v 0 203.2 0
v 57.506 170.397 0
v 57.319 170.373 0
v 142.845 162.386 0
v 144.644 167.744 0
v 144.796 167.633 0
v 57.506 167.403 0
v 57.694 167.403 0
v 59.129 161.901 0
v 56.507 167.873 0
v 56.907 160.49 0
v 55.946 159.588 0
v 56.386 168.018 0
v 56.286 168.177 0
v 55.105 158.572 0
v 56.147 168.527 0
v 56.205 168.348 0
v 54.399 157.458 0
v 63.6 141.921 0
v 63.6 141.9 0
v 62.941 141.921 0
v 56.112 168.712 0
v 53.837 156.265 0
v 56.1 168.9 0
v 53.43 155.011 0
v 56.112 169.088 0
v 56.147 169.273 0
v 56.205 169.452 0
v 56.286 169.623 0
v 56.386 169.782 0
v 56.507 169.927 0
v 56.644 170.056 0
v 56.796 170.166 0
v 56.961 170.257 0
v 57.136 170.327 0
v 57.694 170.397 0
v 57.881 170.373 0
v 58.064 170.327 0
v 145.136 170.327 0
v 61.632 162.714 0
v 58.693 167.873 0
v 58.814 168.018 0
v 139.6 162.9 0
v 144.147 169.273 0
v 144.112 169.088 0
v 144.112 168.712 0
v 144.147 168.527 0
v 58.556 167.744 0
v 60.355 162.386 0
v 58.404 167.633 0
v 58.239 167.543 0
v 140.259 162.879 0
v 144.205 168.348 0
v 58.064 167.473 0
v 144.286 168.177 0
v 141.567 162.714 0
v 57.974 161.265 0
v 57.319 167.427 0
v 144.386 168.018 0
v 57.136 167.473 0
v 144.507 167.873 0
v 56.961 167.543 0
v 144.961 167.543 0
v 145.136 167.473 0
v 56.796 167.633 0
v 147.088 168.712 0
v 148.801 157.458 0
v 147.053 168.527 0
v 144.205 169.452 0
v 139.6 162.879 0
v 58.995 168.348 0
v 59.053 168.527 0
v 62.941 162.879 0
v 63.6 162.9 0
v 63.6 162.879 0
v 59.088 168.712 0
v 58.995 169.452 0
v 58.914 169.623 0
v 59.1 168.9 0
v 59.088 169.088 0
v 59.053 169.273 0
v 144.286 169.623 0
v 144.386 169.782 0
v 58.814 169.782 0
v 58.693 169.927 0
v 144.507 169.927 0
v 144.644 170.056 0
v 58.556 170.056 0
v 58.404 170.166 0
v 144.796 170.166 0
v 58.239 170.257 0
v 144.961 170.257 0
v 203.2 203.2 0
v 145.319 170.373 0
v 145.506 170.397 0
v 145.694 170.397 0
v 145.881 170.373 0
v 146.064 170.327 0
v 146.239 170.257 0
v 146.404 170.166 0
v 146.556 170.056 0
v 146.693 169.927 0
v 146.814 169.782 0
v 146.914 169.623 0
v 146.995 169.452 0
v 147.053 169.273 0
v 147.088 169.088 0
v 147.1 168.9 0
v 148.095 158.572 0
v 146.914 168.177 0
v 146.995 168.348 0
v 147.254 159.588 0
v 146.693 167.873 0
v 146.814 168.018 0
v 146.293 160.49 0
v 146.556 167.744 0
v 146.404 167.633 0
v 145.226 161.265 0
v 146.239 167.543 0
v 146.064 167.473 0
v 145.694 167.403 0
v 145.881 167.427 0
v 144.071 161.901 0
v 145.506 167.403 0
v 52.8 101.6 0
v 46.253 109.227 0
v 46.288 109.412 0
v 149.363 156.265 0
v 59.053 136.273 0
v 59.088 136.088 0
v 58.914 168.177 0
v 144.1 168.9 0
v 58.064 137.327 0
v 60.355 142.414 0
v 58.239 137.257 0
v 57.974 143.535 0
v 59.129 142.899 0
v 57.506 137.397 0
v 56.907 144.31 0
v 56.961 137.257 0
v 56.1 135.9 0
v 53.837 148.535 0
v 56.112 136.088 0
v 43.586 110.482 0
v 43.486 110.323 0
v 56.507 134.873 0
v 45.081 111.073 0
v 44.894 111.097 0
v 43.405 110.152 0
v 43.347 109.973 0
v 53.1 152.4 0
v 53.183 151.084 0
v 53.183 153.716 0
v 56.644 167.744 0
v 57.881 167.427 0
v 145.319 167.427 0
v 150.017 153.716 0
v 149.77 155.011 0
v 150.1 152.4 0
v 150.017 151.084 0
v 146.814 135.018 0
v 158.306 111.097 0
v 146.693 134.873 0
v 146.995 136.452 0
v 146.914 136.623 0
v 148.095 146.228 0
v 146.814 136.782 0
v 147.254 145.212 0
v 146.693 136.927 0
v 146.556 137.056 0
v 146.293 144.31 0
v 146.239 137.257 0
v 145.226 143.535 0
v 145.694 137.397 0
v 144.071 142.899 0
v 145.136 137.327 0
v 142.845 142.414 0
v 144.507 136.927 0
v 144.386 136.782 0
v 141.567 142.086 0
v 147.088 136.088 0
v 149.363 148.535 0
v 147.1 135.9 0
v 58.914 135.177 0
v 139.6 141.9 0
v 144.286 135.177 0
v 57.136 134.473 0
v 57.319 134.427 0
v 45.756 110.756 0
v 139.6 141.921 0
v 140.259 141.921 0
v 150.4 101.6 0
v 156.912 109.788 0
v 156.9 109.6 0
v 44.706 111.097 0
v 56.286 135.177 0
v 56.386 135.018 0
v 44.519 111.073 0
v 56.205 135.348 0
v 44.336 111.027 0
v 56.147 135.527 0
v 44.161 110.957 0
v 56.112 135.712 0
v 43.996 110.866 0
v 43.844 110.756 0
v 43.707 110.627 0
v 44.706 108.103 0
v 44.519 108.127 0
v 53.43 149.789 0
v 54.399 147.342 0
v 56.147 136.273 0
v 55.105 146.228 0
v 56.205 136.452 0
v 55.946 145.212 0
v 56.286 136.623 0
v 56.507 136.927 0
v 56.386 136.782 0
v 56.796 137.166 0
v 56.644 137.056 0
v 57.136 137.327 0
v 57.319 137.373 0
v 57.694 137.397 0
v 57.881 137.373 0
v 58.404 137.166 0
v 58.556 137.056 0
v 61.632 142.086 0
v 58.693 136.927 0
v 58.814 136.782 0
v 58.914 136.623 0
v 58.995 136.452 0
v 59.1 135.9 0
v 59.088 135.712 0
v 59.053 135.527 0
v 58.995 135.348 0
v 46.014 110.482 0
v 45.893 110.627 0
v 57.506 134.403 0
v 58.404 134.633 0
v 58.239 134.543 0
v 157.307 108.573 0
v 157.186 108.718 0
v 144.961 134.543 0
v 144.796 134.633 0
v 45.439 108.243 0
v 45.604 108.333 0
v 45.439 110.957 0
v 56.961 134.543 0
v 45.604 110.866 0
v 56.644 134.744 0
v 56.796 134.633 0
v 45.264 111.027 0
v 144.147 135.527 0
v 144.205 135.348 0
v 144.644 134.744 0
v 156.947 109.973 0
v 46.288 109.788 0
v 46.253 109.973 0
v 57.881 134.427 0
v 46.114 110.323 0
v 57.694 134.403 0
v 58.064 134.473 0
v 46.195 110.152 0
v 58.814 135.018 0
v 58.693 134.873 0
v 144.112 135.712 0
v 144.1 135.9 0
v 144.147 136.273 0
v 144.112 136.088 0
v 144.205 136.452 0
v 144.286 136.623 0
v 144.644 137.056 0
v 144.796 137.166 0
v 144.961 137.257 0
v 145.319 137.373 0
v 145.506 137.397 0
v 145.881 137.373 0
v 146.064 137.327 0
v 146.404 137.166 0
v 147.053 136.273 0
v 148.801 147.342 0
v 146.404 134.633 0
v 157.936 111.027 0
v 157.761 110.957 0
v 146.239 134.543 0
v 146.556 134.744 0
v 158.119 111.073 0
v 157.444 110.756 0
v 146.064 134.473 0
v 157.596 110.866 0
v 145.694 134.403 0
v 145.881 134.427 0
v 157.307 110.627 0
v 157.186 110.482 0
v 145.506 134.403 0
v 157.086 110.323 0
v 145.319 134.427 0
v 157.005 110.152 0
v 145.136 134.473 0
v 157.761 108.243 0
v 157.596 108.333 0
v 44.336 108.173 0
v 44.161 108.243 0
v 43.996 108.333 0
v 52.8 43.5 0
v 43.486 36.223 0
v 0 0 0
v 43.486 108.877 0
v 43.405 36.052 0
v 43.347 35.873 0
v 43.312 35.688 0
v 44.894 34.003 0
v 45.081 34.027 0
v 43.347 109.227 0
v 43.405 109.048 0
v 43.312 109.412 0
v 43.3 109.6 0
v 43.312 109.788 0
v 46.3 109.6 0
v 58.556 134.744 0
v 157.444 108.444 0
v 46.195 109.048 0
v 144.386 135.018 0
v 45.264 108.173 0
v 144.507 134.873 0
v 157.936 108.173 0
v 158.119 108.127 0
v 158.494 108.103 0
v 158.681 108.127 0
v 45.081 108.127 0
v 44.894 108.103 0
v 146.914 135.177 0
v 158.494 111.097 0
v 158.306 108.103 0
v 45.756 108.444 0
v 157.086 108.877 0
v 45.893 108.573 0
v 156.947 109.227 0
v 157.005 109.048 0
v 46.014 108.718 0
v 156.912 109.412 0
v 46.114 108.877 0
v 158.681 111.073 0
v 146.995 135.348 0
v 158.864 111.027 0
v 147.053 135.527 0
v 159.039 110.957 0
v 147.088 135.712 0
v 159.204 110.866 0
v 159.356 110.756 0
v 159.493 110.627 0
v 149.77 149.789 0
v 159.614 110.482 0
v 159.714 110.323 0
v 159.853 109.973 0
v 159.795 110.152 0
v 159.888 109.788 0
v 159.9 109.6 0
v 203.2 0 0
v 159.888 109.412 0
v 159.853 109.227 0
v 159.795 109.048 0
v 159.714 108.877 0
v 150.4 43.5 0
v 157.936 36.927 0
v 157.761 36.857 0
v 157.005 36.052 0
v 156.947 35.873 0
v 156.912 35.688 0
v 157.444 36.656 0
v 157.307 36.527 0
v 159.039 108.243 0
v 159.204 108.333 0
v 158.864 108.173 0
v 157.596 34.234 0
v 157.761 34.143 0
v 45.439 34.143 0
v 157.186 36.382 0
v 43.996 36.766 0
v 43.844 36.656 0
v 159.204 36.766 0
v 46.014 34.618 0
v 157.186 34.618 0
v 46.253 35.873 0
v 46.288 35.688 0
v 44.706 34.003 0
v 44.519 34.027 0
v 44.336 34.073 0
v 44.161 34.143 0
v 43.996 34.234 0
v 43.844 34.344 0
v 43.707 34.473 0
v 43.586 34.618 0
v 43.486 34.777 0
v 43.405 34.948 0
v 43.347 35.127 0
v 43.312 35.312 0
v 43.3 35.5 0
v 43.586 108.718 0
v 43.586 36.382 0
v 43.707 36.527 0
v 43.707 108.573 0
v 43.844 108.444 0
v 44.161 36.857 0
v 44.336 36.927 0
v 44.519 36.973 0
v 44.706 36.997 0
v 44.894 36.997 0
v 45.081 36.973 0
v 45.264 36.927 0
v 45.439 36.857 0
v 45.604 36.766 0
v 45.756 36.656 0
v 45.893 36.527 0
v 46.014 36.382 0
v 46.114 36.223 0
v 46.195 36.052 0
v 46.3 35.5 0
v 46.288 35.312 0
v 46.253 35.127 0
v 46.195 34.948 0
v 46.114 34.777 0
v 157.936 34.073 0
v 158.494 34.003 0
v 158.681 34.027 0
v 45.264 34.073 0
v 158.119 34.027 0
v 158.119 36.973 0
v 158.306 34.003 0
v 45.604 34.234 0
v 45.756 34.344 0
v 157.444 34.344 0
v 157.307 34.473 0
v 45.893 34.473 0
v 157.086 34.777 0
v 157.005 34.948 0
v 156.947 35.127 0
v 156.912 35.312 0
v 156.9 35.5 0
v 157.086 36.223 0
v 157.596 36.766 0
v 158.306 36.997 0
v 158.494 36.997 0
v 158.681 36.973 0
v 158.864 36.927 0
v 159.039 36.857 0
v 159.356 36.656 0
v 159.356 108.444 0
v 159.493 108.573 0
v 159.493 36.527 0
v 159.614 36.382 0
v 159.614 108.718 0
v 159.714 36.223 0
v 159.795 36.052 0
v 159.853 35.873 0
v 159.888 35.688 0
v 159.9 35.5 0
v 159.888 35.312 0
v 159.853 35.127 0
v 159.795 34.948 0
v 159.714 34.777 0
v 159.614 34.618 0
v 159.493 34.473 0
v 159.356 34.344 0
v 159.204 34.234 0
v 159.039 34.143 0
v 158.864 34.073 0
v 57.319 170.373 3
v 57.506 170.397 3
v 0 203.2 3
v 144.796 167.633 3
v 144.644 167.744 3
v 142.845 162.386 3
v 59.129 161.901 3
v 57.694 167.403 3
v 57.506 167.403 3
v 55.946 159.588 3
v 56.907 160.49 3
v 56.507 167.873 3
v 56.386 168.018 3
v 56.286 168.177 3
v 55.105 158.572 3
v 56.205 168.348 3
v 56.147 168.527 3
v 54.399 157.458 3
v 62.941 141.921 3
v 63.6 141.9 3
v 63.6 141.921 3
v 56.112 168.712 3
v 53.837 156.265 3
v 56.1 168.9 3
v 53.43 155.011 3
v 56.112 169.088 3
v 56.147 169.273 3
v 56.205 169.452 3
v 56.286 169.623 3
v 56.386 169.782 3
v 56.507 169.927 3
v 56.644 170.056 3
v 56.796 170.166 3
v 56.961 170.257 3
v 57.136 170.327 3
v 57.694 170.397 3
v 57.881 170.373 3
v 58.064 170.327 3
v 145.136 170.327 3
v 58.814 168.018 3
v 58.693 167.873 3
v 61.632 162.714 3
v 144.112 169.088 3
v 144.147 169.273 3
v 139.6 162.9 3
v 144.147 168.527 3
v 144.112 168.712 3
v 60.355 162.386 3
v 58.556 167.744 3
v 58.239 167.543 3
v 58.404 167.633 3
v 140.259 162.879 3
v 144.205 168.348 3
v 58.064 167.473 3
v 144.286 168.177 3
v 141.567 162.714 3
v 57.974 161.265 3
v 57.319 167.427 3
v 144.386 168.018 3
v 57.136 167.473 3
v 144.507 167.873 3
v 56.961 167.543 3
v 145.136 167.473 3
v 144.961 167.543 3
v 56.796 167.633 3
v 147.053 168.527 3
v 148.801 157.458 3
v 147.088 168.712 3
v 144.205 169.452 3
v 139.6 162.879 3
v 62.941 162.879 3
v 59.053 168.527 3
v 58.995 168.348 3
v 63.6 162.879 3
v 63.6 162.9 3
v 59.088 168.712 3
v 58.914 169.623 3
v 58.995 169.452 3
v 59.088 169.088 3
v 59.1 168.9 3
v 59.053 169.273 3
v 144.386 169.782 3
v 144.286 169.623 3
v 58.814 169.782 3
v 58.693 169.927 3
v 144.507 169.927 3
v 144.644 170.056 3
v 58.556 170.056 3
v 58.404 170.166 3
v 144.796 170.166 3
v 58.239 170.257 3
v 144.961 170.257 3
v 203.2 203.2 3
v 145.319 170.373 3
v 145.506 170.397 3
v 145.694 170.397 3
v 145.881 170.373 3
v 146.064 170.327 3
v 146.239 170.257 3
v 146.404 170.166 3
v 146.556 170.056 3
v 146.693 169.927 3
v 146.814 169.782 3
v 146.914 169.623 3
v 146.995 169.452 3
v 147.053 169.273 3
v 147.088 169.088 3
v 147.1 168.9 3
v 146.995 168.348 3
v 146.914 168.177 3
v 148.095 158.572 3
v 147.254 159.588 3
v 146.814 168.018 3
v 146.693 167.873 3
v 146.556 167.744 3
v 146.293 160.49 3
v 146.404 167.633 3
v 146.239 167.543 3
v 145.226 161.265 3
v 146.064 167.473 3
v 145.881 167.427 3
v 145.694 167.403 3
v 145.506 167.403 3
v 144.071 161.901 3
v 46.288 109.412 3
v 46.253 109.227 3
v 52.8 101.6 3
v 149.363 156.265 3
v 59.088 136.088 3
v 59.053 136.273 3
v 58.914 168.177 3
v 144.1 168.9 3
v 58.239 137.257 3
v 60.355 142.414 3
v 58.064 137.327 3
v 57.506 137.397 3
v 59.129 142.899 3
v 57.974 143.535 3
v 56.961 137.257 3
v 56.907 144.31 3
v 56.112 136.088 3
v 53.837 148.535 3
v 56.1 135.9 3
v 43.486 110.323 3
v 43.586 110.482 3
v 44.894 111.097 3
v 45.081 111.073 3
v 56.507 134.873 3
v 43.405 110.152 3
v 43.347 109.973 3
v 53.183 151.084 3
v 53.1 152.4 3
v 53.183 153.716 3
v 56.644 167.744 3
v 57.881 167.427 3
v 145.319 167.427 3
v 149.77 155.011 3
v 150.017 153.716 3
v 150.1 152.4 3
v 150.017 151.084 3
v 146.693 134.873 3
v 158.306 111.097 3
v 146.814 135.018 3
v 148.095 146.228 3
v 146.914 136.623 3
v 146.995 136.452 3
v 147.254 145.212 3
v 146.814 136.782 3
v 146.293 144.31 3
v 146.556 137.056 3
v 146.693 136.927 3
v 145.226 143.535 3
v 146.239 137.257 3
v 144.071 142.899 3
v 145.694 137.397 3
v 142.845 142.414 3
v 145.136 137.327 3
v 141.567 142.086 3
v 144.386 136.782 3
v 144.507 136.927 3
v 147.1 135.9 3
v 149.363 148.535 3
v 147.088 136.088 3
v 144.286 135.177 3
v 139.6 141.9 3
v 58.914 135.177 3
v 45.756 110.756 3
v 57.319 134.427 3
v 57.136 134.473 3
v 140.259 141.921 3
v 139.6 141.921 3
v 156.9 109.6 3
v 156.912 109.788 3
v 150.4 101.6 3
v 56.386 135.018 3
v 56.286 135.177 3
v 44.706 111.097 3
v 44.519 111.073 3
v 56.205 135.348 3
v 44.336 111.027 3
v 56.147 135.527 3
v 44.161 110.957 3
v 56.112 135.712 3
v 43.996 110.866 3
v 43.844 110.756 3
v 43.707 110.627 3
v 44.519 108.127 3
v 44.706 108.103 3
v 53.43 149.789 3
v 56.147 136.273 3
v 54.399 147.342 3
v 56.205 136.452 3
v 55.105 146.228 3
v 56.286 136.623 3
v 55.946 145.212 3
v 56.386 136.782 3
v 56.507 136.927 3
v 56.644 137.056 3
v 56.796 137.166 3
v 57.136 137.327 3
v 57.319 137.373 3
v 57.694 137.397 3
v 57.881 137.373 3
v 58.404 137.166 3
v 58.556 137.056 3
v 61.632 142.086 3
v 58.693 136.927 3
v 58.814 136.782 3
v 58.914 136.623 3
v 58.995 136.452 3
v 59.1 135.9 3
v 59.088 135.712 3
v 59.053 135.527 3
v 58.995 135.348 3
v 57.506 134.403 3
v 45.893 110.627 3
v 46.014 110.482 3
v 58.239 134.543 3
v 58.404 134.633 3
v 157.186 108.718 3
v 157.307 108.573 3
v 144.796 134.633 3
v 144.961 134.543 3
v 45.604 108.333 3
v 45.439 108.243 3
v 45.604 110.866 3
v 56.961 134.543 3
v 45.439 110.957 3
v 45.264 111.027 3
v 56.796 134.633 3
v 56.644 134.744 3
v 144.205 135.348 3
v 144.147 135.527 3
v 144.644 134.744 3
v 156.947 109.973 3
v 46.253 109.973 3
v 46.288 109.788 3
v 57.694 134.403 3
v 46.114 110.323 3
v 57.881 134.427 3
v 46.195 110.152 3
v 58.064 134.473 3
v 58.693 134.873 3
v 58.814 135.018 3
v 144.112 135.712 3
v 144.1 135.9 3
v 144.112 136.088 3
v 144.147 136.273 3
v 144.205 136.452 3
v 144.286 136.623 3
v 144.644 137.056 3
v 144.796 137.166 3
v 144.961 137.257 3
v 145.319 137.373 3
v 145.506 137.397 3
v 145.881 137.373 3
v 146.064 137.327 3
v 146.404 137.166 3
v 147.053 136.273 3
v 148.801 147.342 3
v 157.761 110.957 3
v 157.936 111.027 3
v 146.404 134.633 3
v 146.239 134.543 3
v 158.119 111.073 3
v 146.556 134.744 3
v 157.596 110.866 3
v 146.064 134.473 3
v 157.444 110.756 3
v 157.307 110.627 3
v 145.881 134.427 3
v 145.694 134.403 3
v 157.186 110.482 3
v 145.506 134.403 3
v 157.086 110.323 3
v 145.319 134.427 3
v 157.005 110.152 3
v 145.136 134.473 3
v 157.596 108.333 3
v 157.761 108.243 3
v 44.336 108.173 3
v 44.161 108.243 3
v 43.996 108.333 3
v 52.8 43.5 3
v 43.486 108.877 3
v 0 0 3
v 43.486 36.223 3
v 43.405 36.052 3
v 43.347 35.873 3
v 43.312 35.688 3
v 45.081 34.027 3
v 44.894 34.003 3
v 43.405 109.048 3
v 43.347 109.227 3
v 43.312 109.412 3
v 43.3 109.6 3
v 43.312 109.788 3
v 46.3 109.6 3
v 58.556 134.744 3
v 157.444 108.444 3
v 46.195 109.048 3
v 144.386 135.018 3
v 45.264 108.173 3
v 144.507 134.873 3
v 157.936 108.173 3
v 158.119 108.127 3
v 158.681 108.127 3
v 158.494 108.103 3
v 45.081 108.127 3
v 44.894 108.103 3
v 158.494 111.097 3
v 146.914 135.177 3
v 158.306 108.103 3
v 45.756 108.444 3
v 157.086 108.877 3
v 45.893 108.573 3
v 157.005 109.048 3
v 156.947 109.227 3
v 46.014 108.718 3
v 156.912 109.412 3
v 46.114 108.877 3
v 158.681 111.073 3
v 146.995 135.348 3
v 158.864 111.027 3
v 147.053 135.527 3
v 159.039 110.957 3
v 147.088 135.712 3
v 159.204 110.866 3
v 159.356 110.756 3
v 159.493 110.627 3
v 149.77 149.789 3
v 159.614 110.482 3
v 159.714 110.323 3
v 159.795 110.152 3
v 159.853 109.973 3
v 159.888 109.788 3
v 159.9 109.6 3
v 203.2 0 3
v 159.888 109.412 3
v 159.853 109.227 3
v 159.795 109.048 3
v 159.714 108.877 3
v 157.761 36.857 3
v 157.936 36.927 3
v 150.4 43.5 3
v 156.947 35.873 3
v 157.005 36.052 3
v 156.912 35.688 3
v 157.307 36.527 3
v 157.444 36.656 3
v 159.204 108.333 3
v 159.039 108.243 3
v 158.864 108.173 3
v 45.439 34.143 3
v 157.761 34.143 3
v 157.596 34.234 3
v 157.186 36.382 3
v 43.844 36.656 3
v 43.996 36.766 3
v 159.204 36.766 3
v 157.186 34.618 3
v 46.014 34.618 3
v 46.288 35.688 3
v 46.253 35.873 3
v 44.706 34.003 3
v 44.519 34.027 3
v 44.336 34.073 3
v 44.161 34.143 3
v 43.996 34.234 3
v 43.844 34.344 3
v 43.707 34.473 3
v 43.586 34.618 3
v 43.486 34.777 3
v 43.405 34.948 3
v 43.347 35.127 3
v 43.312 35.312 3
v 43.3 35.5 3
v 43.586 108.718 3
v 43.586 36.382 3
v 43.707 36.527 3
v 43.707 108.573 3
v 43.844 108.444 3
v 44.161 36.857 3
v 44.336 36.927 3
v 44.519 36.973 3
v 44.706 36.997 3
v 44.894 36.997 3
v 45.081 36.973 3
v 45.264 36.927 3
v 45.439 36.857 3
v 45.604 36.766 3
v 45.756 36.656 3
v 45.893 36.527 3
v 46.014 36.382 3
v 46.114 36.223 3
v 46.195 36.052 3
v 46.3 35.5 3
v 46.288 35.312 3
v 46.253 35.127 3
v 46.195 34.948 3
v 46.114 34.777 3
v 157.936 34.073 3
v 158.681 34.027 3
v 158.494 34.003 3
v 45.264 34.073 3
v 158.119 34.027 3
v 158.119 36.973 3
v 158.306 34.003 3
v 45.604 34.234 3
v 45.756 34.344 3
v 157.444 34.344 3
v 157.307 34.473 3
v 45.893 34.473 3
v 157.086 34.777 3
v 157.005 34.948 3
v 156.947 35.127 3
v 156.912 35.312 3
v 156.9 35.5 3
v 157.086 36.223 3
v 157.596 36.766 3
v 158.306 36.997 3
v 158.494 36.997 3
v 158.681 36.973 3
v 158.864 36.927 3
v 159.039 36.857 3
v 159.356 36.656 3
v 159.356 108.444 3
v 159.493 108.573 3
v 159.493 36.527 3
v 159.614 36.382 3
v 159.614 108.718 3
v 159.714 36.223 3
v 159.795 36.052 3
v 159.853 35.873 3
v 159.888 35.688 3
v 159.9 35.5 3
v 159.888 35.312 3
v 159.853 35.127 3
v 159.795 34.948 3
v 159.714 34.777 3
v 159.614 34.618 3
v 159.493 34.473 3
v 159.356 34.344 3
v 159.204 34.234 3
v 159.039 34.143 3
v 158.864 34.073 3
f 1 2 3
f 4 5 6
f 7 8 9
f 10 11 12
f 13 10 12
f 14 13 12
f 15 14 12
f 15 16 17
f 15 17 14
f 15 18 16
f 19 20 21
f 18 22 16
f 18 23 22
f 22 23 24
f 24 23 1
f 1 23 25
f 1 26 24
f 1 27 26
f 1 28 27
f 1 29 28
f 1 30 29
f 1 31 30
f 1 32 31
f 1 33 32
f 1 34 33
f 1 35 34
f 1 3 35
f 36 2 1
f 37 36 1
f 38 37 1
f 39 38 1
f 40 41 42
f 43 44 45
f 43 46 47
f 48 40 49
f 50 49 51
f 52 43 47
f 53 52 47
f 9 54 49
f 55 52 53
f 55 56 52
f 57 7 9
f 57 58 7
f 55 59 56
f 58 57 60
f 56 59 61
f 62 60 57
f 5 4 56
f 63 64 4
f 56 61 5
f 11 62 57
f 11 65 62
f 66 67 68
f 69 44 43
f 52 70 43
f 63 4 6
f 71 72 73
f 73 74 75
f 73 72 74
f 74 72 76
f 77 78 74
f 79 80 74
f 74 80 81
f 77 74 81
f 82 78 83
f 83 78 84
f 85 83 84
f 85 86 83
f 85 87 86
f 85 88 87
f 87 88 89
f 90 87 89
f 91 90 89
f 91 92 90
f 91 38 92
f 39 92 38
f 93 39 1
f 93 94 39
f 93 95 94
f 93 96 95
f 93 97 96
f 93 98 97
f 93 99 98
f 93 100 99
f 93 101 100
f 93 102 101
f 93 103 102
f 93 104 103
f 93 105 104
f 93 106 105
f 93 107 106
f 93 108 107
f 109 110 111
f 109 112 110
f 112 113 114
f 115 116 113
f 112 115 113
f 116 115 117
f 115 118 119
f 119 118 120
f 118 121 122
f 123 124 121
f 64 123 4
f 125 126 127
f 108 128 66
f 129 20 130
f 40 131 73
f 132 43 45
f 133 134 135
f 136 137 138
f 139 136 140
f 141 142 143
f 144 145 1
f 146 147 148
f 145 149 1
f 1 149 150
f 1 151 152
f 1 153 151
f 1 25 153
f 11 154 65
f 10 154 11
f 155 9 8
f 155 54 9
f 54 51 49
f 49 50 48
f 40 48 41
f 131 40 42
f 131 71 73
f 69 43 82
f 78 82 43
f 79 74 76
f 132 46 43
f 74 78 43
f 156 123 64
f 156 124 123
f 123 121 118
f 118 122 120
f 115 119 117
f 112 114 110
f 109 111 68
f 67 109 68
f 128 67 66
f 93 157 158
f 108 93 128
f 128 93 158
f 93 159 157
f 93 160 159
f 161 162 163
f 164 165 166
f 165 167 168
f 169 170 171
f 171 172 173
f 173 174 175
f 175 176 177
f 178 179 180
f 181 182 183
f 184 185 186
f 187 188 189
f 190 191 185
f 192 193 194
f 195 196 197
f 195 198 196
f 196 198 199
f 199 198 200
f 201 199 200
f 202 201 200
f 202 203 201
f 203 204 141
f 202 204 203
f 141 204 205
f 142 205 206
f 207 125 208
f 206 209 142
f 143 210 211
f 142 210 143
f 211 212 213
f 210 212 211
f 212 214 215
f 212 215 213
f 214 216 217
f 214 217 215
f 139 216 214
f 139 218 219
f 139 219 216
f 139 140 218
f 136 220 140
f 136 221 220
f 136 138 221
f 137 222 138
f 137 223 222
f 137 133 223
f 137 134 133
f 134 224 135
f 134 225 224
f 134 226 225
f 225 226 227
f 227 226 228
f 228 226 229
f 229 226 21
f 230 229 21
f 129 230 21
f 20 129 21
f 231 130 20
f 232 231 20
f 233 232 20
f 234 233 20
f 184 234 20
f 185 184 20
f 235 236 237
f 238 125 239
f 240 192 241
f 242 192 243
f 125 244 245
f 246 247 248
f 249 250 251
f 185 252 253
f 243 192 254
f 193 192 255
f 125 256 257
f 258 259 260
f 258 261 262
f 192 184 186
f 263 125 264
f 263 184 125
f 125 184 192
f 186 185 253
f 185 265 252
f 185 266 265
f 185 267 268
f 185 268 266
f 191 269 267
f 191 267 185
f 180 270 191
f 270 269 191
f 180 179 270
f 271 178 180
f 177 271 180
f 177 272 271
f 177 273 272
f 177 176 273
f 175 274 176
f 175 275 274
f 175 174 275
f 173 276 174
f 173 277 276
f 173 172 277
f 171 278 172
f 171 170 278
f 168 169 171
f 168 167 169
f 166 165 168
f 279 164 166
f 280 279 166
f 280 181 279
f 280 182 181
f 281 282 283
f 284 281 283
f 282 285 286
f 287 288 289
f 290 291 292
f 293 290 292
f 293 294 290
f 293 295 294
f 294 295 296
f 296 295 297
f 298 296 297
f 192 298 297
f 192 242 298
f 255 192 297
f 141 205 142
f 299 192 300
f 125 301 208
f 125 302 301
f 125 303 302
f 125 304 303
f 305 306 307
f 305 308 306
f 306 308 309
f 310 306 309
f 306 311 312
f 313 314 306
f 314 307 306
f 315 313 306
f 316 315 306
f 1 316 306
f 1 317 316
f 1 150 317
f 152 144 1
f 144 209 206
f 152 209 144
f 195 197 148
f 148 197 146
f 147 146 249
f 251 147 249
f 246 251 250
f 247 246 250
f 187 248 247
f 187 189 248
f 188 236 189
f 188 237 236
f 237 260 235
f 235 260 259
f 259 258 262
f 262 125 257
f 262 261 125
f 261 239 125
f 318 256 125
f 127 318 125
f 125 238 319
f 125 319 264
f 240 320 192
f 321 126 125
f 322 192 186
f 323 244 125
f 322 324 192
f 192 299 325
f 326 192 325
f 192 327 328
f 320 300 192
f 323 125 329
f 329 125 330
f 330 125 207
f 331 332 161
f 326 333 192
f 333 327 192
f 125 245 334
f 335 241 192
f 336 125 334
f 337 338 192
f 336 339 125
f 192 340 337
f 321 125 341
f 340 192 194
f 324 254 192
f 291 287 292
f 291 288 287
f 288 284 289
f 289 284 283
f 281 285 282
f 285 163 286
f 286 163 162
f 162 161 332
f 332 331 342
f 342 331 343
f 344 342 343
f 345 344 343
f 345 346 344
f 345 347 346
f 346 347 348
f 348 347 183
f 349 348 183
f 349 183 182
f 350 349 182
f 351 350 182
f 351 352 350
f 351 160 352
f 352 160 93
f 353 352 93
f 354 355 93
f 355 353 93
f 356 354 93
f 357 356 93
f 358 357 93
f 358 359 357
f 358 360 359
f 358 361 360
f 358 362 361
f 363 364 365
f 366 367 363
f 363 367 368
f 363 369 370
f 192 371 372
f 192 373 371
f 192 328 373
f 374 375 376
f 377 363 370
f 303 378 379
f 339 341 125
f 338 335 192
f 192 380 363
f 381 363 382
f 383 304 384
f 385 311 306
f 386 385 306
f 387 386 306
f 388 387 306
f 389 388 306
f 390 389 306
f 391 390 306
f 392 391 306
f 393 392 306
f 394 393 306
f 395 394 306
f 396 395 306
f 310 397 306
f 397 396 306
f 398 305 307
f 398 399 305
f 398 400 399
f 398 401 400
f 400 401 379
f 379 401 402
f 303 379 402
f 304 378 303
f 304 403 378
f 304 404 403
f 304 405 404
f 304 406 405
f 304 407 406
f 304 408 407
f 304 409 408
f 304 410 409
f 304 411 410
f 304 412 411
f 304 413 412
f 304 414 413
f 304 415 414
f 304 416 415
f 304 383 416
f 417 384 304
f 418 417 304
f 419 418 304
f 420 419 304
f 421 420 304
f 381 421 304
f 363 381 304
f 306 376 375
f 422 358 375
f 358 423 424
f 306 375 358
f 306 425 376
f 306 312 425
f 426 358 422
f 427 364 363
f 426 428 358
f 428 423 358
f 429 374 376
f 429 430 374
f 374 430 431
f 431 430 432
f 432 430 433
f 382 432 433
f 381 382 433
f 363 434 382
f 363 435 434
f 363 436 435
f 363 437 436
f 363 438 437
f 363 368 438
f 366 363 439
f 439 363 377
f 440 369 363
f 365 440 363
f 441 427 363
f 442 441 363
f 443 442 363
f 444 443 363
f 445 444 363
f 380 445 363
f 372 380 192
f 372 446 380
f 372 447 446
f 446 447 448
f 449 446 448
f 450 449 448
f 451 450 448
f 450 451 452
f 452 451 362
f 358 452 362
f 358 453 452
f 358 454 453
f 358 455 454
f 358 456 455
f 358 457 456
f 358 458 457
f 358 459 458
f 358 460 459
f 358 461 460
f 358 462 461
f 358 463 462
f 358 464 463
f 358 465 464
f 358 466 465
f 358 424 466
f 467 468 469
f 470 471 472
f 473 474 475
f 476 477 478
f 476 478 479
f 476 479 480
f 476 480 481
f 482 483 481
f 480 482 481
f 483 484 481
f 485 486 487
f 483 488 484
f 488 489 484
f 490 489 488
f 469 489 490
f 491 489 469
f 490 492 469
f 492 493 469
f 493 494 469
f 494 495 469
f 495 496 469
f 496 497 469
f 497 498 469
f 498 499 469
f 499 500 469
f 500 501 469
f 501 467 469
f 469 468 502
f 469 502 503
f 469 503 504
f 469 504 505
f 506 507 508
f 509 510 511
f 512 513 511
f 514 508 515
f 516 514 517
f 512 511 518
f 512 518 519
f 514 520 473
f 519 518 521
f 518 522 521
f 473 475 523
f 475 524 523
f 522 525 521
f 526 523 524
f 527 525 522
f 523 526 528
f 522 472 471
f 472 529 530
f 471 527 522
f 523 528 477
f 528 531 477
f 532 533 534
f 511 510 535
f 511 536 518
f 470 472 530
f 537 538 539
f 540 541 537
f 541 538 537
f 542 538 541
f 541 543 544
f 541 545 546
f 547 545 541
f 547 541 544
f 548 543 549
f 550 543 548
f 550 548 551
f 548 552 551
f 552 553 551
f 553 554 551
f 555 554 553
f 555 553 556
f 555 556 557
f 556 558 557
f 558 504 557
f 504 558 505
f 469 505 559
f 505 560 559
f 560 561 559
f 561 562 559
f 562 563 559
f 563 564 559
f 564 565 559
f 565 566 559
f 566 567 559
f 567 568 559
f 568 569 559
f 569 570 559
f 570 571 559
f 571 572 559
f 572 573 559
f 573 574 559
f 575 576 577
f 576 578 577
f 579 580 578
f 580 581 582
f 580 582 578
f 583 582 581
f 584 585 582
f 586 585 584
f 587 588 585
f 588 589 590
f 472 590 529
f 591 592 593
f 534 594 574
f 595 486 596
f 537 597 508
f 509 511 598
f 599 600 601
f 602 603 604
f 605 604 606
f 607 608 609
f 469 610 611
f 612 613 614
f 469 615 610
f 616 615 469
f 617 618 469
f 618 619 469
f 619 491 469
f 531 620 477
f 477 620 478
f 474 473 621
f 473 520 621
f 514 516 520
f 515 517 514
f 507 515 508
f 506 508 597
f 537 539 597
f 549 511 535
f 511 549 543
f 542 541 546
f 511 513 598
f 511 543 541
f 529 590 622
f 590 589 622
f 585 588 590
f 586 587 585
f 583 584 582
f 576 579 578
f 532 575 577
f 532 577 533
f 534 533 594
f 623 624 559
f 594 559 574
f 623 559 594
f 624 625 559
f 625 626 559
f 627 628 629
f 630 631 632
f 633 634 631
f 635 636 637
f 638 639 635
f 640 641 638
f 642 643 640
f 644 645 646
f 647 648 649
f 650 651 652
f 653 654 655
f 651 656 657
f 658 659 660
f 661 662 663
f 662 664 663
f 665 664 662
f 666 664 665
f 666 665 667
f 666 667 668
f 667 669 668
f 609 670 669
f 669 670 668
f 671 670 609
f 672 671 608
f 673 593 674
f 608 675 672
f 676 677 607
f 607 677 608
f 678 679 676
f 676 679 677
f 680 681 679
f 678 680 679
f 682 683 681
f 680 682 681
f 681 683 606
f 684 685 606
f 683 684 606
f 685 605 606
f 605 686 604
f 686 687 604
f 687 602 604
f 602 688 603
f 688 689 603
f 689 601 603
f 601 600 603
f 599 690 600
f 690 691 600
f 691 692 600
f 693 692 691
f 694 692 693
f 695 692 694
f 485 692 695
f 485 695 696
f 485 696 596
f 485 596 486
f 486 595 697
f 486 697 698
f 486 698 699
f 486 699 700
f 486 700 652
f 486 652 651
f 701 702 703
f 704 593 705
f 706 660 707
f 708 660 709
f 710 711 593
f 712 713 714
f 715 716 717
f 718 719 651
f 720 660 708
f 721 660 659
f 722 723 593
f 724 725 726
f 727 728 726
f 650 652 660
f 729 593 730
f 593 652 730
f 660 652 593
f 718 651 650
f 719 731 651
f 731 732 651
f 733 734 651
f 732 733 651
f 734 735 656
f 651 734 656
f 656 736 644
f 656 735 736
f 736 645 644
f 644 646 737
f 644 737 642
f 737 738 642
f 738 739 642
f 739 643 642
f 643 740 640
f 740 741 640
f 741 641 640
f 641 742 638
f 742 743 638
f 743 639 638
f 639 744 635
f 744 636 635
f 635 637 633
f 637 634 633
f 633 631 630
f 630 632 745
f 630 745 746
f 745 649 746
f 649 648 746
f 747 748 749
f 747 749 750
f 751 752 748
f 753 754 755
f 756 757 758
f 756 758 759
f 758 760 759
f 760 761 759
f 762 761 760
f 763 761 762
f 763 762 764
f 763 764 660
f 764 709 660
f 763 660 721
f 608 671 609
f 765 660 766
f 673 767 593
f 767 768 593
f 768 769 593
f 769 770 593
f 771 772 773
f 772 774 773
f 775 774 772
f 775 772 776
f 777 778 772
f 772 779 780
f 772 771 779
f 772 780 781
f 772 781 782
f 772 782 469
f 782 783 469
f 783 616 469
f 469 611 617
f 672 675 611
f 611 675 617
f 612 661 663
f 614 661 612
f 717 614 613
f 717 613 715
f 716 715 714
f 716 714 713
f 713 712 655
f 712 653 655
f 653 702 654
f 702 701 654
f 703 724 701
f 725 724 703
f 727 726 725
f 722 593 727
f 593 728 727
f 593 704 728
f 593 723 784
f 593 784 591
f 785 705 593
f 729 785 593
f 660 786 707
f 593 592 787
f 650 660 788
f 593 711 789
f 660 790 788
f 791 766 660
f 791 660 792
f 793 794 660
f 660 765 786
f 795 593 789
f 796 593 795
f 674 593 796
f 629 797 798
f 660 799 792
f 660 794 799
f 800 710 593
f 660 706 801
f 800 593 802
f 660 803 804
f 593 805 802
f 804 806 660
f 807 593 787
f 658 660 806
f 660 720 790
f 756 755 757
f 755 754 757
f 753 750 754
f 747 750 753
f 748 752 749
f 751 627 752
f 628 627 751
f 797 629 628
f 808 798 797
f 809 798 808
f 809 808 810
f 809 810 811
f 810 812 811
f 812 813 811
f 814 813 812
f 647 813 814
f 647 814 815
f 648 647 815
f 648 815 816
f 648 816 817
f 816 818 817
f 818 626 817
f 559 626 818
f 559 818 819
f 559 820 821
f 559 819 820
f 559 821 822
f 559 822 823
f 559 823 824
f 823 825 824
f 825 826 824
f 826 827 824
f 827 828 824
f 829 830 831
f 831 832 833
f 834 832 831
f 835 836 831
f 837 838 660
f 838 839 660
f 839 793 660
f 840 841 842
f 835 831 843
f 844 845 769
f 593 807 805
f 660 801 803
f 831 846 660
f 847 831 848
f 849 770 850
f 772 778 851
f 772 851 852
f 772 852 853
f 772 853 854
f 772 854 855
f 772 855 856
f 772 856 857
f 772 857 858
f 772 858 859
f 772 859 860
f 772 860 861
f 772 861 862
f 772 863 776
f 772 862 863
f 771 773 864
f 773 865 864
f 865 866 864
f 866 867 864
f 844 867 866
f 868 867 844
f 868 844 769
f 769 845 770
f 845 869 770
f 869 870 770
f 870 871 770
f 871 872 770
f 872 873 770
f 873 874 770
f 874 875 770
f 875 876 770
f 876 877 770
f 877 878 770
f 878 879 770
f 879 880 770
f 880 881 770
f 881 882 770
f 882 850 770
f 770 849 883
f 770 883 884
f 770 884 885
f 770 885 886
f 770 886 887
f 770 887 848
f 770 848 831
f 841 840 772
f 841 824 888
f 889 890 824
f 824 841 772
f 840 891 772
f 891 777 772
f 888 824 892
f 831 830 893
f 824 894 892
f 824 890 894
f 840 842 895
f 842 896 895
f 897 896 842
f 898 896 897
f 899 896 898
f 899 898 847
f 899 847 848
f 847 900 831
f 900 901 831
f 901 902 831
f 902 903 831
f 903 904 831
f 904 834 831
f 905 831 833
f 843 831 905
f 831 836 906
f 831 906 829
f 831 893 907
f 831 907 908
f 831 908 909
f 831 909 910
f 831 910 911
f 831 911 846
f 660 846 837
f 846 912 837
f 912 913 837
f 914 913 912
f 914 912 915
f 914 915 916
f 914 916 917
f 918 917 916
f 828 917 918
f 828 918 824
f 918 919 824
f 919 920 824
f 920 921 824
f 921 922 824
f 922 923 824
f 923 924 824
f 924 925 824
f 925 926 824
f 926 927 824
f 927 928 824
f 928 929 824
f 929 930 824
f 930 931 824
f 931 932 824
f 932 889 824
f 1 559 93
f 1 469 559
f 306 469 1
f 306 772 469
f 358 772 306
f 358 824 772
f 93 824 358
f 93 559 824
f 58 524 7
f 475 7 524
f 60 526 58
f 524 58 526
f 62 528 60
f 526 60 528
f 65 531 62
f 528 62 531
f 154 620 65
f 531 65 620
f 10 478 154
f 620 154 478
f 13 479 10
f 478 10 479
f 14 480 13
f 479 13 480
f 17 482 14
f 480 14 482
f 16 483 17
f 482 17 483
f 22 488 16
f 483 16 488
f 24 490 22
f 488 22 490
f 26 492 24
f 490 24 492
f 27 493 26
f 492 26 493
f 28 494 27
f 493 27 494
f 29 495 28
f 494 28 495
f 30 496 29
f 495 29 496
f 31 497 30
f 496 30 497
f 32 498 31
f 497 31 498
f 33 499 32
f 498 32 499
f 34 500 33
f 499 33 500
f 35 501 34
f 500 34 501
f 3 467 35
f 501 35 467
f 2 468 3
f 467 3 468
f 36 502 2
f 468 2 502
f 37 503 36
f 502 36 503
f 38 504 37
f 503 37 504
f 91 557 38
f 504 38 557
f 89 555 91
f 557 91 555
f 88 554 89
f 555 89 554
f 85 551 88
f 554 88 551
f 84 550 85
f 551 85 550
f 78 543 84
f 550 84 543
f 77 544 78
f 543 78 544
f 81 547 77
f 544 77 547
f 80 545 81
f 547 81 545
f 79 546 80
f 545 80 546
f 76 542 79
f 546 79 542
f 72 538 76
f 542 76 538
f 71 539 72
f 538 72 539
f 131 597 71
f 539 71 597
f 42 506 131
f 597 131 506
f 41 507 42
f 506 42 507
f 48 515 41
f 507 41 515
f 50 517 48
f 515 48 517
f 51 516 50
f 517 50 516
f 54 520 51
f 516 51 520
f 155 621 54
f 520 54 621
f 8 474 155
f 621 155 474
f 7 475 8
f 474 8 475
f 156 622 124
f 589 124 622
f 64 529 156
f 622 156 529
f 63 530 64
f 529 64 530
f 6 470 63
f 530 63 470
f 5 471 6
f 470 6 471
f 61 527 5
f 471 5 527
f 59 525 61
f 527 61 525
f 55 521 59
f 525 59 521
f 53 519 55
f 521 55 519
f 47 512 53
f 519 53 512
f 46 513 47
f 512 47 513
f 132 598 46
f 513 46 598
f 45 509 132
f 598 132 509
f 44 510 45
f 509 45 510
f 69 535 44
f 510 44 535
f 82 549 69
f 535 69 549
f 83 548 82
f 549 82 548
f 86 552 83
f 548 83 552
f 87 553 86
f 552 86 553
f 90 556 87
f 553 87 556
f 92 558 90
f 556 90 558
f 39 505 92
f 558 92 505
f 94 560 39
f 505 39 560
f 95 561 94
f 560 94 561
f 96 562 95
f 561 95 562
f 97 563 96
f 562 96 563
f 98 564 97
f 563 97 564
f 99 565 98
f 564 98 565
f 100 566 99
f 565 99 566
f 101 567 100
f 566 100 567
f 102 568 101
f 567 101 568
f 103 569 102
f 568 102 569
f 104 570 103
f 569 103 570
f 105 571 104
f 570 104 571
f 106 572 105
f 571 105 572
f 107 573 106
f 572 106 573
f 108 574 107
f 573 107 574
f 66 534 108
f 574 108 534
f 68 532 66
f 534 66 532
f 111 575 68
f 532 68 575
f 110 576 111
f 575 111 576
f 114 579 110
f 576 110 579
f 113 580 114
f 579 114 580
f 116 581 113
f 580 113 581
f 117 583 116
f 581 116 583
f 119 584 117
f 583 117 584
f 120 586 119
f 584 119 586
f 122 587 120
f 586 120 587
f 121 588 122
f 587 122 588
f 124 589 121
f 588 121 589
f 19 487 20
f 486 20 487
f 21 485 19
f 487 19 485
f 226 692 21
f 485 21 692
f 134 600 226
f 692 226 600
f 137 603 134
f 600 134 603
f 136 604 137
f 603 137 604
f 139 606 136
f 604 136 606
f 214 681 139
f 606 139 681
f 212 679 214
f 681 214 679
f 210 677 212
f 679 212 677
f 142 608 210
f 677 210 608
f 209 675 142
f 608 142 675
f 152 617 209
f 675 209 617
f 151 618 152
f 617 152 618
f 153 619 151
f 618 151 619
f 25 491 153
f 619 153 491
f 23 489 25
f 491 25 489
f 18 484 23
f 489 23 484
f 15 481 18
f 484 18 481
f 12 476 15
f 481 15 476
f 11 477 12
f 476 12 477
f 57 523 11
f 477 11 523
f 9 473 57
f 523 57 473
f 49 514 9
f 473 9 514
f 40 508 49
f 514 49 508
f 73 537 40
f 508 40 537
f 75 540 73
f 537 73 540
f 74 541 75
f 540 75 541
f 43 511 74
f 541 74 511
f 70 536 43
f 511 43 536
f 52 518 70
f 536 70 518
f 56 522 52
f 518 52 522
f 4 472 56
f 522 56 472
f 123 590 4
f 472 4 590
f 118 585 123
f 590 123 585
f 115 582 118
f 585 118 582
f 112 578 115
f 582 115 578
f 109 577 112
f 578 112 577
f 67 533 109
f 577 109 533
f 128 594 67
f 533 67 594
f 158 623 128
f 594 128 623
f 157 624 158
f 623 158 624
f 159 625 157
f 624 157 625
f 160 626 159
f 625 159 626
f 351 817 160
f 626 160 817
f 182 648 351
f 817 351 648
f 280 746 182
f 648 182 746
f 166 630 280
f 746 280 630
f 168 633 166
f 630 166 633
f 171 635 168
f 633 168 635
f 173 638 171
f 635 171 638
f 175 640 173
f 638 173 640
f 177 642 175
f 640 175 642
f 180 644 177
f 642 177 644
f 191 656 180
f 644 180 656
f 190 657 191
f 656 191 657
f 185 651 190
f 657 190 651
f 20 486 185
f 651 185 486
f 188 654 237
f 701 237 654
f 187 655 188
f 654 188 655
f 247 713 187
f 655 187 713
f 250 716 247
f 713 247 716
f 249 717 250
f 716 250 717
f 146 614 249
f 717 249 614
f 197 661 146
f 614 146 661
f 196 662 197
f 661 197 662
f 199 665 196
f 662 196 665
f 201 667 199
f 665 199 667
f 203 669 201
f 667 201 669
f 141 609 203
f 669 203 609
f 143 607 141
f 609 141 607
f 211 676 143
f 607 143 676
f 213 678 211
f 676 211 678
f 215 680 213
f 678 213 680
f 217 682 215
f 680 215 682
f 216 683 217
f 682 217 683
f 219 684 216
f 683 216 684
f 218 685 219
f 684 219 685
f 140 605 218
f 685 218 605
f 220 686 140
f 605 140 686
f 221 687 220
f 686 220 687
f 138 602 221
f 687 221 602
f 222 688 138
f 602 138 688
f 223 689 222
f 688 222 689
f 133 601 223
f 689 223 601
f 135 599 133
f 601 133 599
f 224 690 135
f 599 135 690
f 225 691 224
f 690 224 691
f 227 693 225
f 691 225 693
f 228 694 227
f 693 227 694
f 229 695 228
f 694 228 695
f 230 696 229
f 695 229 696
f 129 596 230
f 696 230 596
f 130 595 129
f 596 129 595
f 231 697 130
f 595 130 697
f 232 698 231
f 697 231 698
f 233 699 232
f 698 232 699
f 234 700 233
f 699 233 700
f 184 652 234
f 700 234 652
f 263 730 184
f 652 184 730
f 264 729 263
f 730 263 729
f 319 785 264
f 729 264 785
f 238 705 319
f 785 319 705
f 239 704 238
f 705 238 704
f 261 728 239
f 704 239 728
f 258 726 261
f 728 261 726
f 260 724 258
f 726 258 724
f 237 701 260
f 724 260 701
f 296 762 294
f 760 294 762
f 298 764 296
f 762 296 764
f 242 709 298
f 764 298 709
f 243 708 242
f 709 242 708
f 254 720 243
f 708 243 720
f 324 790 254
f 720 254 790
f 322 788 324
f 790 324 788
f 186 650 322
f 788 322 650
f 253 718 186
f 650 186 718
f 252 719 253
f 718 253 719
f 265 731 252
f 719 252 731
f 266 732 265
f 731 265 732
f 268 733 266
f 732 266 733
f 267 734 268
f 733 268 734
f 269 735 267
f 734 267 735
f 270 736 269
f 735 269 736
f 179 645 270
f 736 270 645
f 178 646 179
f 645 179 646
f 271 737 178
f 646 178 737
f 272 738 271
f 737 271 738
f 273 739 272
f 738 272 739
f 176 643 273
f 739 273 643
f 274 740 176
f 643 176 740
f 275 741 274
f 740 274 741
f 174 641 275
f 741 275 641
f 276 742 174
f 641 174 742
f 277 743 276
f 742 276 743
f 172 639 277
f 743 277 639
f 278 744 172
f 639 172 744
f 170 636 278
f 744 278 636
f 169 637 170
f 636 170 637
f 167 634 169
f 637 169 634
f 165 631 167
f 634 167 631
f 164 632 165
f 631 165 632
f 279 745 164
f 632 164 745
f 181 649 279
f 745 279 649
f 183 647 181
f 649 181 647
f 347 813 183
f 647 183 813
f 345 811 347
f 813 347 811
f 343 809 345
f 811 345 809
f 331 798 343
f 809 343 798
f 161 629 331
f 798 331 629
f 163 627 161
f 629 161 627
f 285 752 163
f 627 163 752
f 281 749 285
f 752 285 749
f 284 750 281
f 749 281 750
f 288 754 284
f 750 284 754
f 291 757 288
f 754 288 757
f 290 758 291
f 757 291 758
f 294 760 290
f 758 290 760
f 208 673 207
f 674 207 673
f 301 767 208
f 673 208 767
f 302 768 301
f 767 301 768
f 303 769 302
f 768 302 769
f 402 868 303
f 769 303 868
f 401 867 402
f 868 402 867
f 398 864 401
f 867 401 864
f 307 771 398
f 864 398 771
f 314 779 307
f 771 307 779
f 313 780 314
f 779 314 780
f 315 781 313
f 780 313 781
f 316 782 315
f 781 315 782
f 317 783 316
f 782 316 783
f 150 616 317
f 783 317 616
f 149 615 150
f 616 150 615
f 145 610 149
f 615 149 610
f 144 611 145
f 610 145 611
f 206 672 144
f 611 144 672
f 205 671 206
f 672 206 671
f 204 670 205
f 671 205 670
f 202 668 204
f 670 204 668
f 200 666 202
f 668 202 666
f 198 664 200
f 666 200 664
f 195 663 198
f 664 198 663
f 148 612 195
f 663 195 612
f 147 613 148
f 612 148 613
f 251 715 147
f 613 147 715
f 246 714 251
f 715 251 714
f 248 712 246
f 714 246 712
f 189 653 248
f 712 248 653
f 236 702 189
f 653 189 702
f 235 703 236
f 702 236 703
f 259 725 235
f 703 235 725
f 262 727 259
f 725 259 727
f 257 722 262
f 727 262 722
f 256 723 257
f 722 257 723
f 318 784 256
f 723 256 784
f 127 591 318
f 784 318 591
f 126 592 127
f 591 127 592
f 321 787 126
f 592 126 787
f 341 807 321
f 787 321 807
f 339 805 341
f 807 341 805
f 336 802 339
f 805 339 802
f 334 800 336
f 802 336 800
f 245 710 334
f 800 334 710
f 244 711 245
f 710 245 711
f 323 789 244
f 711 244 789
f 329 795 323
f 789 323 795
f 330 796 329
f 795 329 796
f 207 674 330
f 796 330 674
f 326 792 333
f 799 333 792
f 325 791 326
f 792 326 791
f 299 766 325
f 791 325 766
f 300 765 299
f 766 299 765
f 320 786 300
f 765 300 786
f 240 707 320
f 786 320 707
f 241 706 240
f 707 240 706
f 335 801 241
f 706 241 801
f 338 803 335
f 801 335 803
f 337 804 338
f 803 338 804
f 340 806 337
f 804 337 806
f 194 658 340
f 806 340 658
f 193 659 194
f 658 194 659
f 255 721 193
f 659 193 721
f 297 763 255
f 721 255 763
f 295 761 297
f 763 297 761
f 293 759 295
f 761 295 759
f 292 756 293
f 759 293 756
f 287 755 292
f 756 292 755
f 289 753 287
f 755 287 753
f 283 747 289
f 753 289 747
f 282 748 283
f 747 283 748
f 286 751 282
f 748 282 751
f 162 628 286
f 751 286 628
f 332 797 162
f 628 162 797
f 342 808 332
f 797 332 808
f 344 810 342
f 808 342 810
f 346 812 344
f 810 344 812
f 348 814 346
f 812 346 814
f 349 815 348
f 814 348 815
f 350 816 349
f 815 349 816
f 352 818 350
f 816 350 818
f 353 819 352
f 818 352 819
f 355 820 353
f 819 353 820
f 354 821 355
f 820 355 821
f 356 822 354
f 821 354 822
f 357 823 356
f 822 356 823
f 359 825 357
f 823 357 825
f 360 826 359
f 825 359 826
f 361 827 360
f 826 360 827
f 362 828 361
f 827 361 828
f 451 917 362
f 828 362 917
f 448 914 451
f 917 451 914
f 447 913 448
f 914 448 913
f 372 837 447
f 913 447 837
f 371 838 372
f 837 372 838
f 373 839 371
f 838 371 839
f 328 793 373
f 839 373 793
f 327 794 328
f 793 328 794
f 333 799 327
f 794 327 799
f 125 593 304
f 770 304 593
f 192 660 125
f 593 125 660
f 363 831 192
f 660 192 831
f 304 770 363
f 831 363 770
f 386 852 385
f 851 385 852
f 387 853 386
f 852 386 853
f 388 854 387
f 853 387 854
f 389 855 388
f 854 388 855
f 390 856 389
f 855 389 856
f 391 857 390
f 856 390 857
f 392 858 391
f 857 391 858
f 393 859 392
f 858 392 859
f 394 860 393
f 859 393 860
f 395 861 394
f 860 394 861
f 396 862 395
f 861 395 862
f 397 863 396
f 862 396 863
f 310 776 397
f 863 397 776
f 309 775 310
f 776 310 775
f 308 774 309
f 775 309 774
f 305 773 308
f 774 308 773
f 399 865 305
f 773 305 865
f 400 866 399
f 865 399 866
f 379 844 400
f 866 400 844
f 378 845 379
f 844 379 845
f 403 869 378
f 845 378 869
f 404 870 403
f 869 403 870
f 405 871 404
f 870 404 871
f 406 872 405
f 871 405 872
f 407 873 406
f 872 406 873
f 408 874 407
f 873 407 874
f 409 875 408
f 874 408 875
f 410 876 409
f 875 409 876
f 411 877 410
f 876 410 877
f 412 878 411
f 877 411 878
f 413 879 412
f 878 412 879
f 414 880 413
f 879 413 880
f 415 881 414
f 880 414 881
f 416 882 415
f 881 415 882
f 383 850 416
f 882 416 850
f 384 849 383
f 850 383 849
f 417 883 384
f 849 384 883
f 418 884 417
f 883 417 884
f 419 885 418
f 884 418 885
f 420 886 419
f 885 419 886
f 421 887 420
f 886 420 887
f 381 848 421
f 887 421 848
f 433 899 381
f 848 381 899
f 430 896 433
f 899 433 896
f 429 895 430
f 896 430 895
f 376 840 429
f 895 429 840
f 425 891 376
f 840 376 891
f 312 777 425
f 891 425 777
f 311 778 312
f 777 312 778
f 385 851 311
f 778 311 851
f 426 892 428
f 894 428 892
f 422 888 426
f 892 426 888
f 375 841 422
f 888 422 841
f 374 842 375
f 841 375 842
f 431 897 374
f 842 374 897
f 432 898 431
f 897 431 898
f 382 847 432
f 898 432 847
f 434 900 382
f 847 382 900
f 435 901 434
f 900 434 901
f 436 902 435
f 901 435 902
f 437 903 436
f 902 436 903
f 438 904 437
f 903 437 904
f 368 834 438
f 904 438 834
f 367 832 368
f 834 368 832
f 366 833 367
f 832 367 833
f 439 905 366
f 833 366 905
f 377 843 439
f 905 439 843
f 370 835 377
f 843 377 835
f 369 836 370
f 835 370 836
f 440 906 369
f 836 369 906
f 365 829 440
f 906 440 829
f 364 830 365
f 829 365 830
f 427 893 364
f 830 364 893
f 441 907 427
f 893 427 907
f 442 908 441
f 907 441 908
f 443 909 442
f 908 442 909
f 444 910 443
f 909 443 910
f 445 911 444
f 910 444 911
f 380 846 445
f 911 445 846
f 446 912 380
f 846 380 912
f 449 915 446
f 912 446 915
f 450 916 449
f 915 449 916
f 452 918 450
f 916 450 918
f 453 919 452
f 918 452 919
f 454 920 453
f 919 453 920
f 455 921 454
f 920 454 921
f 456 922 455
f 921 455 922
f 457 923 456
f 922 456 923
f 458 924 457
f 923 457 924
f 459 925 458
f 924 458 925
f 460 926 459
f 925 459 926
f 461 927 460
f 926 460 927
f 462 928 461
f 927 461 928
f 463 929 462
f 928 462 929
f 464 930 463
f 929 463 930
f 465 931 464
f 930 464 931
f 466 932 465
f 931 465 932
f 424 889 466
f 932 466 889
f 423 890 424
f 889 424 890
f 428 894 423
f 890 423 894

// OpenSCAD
face_plate_width = 203.2;
face_plate_height = 203.2;
face_plate_depth = 3;
screen_width = 97.6;
screen_height = 58.1;
camera_width = 99 - 2;  // the camera face is slightly smaller than the dimensions given by Intel
camera_height = 23 - 2;  // the camera face is slightly smaller than the dimensions given by Intel
camera_depth = 20.05;
camera_mount_width = 45;
screw_hole_diameter = 3;
screw_hole_offset = 8;

front_of_face_to_front_of_back = 29.56;

face_plate(face_plate_width, face_plate_height);

// move away from face plate
//translate([0, -3 * camera_height]) 

// move over face plate to check alignment of holes
//translate([(face_plate_width - camera_width) / 2, (face_plate_height / 4 * 3) - camera_height, face_plate_depth]) 
//    camera_bracket(camera_width, camera_height, camera_depth);

module face_plate(width, height)
{
    camera_origin = [(width - camera_width) / 2, (height / 4 * 3) - (camera_height / 2)];
    screen_origin = [(width - screen_width)/ 2, height / 2 - screen_height];
    
    linear_extrude(height=face_plate_depth) difference()
    {
        // make the faceplate
        square([width, height]);

        // make a hole for the camera
        translate(camera_origin) camera(camera_width, camera_height);
        
         // screw holes for camera bracket
        translate(camera_origin) translate([1.5 * screw_hole_diameter, 1.5 * screw_hole_diameter - camera_height / 2]) 
            circle(d = screw_hole_diameter, $fn=50);
        translate(camera_origin) translate([1.5 * screw_hole_diameter, camera_height - 1.5 * screw_hole_diameter + camera_height / 2]) 
            circle(d = screw_hole_diameter, $fn=50);
        translate(camera_origin) translate([camera_width - 1.5 * screw_hole_diameter, 1.5 * screw_hole_diameter - camera_height / 2]) 
            circle(d = screw_hole_diameter, $fn=50);
        translate(camera_origin) translate([camera_width - 1.5 * screw_hole_diameter, camera_height - 1.5 * screw_hole_diameter + camera_height / 2]) 
            circle(d = screw_hole_diameter, $fn=50);
        
        // make a hold for the screen
        translate(screen_origin) square([screen_width, screen_height]);
        
        // screw holes for screen
        translate(screen_origin) translate([-screw_hole_offset, -screw_hole_offset]) 
            circle(d = screw_hole_diameter, $fn=50);
        translate(screen_origin) translate([-screw_hole_offset, screen_height + screw_hole_offset]) 
            circle(d = screw_hole_diameter, $fn=50);
        translate(screen_origin) translate([screen_width + screw_hole_offset, -screw_hole_offset]) 
            circle(d = screw_hole_diameter, $fn=50);
        translate(screen_origin) translate([screen_width + screw_hole_offset, screen_height + screw_hole_offset]) 
            circle(d = screw_hole_diameter, $fn=50);
    }
}

module camera(width, height)
{
    translate([height / 2, height / 2]) union()
    {
        circle(d = height, $fn=50);
        translate([0, -height / 2]) square([width - height, height]);
        translate([width - height, 0]) circle(d = height, $fn=50);
    }
}

// dimensions should be for the camera size
// the walls will be expanded to leave at least this much interior room
module camera_bracket(width, height, depth) 
{
    // fudge factor to get render to show removed material correctly
    fudge = 0.01;

    wall_thickness = 3 * screw_hole_diameter;
    
    difference()
    {
        // make an opened ended bracket that will make the face of the camera flush with the face plate
        cube([width, 2 * height, depth]);
        translate([-fudge, wall_thickness, -fudge]) 
            cube([width + 2 * fudge, 2 * height - 2 * wall_thickness, depth - face_plate_depth + fudge]);
        translate([width / 9, -fudge, -fudge]) 
            cube([width * 7 / 9, 2 * (height + fudge), depth - face_plate_depth + fudge]);

         // screw holes for camera
        translate([width / 2 - camera_mount_width / 2, height]) 
            cylinder(d = screw_hole_diameter, h = height + fudge, $fn=50);
        translate([width / 2 + camera_mount_width / 2, height]) 
            cylinder(d = screw_hole_diameter, h = height + fudge, $fn=50);
        
         // screw holes for bracket (smaller to hold threads)
        translate([1.5 * screw_hole_diameter, 1.5 * screw_hole_diameter, -fudge]) 
            cylinder(d = screw_hole_diameter - 0.5, h = height + 2 * fudge, $fn=50);
        translate([1.5 * screw_hole_diameter, 2 * height - 1.5 * screw_hole_diameter, -fudge]) 
            cylinder(d = screw_hole_diameter - 0.5, h = height + 2 * fudge, $fn=50);
        translate([width - 1.5 * screw_hole_diameter, 1.5 * screw_hole_diameter, -fudge]) 
            cylinder(d = screw_hole_diameter - 0.5, h = height + 2 * fudge, $fn=50);
        translate([width - 1.5 * screw_hole_diameter, 2 * height - 1.5 * screw_hole_diameter, -fudge]) 
            cylinder(d = screw_hole_diameter - 0.5, h = height + 2 * fudge, $fn=50);
   }
}
